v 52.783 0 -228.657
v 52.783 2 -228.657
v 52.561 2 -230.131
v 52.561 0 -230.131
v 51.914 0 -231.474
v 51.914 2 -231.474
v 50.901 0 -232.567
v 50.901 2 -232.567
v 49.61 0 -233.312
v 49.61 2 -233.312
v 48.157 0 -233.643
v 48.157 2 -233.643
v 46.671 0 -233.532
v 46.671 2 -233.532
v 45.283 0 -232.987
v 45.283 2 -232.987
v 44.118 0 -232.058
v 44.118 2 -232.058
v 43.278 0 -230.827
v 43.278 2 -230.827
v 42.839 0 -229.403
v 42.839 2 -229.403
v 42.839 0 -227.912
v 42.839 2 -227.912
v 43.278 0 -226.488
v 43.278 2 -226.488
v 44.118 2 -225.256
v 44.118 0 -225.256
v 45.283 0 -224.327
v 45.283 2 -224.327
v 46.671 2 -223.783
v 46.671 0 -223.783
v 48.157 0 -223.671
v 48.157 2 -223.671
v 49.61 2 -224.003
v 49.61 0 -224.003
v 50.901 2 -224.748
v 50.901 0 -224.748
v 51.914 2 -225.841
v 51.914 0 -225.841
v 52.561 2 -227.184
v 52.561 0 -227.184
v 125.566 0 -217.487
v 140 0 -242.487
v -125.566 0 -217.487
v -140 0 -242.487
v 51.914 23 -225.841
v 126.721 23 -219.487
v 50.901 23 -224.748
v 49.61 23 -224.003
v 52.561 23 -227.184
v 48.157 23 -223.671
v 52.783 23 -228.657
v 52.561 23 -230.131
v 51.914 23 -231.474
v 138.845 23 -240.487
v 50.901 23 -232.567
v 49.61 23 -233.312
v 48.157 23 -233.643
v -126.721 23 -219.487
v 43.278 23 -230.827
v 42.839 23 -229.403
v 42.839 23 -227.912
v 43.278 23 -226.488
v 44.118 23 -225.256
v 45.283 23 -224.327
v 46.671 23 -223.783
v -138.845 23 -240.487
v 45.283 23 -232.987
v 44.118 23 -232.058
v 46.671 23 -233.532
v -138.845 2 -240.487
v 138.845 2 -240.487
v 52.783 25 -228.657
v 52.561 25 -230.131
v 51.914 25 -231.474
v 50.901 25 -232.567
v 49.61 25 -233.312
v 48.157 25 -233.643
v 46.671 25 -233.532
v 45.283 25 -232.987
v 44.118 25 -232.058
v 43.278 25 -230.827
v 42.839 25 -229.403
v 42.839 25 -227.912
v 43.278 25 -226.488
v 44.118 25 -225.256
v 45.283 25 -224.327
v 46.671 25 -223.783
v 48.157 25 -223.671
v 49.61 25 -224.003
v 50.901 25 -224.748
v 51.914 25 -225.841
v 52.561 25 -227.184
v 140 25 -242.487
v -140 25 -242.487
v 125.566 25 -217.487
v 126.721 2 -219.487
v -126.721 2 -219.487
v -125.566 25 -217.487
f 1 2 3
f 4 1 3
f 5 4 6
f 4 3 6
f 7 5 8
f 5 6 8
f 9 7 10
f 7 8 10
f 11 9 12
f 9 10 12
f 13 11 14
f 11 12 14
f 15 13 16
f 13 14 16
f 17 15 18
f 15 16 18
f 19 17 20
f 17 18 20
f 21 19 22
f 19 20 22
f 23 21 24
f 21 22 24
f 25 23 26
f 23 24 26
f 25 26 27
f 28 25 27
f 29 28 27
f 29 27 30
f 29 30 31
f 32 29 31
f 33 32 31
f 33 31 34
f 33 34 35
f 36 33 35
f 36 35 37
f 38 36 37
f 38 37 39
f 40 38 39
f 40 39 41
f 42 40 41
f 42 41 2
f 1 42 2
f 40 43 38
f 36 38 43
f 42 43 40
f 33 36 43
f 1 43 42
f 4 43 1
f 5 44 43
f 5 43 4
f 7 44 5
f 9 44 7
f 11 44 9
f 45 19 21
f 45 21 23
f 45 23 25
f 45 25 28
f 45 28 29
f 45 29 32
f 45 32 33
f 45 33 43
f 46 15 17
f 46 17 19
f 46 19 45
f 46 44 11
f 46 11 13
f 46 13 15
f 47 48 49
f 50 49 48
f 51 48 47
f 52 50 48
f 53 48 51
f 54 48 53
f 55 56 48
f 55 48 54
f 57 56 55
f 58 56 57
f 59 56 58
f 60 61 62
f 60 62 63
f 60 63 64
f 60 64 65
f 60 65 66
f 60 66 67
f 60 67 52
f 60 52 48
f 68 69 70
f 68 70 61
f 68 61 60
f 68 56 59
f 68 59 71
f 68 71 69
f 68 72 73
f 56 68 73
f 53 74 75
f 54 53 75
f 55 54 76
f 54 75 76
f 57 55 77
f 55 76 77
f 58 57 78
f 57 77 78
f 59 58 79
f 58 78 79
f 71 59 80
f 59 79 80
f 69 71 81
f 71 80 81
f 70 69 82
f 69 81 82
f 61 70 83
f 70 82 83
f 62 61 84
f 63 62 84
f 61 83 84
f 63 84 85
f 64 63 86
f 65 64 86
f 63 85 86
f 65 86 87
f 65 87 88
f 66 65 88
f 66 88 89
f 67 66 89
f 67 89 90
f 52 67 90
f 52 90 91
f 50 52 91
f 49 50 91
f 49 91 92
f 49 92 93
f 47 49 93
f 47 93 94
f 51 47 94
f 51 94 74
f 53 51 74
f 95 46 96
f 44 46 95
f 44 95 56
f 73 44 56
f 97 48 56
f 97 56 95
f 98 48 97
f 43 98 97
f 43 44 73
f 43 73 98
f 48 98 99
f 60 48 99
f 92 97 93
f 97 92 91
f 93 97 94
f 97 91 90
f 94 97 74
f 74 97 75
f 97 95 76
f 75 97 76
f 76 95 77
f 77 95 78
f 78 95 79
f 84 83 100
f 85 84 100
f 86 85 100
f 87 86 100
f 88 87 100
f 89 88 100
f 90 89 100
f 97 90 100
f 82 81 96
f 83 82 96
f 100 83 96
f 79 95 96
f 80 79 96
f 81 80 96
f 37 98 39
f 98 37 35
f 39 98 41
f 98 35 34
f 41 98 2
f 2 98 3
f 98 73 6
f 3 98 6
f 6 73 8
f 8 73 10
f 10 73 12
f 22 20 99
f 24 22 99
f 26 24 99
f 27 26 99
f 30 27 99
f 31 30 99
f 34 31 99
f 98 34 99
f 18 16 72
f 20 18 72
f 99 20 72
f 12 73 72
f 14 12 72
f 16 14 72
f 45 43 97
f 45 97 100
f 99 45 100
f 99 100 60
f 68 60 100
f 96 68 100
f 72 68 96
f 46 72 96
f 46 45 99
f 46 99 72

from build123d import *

# Parameters (mm, degrees)
BOSS_EXTRUDE1_DEPTH = 25
SHELL1_T            = -2
SKETCH2_R           = 5
CUT_EXTRUDE1_DEPTH  = 53


with BuildPart() as part:
    # Sketch1 → Boss-Extrude1 (new body)
    with BuildSketch(Plane(origin=(0, 0, 0), x_dir=(1, 0, 0), z_dir=(0, 1, 0))):
        Polygon((125.56624327, 217.48711306), (-125.56624327, 217.48711306), (-140, 242.48711306), (140, 242.48711306), align=None)
    extrude(amount=BOSS_EXTRUDE1_DEPTH)

    # Shell1
    shell1_openings = [part.faces().sort_by_distance(p)[0] for p in [
        (-132.783121635, 12.5, -229.98711306),
        (132.783121635, 12.5, -229.98711306),
    ]]
    offset(amount=SHELL1_T, openings=shell1_openings, kind=Kind.INTERSECTION)

    # Sketch2 → Cut-Extrude1 (cut)
    with BuildSketch(Plane(origin=(0, 25, 0), x_dir=(1, 0, 0), z_dir=(0, 1, 0))):
        with Locations((47.783121635, 228.657359562)):
            Circle(SKETCH2_R)
    extrude(amount=-CUT_EXTRUDE1_DEPTH, mode=Mode.SUBTRACT)


solid = part.part
